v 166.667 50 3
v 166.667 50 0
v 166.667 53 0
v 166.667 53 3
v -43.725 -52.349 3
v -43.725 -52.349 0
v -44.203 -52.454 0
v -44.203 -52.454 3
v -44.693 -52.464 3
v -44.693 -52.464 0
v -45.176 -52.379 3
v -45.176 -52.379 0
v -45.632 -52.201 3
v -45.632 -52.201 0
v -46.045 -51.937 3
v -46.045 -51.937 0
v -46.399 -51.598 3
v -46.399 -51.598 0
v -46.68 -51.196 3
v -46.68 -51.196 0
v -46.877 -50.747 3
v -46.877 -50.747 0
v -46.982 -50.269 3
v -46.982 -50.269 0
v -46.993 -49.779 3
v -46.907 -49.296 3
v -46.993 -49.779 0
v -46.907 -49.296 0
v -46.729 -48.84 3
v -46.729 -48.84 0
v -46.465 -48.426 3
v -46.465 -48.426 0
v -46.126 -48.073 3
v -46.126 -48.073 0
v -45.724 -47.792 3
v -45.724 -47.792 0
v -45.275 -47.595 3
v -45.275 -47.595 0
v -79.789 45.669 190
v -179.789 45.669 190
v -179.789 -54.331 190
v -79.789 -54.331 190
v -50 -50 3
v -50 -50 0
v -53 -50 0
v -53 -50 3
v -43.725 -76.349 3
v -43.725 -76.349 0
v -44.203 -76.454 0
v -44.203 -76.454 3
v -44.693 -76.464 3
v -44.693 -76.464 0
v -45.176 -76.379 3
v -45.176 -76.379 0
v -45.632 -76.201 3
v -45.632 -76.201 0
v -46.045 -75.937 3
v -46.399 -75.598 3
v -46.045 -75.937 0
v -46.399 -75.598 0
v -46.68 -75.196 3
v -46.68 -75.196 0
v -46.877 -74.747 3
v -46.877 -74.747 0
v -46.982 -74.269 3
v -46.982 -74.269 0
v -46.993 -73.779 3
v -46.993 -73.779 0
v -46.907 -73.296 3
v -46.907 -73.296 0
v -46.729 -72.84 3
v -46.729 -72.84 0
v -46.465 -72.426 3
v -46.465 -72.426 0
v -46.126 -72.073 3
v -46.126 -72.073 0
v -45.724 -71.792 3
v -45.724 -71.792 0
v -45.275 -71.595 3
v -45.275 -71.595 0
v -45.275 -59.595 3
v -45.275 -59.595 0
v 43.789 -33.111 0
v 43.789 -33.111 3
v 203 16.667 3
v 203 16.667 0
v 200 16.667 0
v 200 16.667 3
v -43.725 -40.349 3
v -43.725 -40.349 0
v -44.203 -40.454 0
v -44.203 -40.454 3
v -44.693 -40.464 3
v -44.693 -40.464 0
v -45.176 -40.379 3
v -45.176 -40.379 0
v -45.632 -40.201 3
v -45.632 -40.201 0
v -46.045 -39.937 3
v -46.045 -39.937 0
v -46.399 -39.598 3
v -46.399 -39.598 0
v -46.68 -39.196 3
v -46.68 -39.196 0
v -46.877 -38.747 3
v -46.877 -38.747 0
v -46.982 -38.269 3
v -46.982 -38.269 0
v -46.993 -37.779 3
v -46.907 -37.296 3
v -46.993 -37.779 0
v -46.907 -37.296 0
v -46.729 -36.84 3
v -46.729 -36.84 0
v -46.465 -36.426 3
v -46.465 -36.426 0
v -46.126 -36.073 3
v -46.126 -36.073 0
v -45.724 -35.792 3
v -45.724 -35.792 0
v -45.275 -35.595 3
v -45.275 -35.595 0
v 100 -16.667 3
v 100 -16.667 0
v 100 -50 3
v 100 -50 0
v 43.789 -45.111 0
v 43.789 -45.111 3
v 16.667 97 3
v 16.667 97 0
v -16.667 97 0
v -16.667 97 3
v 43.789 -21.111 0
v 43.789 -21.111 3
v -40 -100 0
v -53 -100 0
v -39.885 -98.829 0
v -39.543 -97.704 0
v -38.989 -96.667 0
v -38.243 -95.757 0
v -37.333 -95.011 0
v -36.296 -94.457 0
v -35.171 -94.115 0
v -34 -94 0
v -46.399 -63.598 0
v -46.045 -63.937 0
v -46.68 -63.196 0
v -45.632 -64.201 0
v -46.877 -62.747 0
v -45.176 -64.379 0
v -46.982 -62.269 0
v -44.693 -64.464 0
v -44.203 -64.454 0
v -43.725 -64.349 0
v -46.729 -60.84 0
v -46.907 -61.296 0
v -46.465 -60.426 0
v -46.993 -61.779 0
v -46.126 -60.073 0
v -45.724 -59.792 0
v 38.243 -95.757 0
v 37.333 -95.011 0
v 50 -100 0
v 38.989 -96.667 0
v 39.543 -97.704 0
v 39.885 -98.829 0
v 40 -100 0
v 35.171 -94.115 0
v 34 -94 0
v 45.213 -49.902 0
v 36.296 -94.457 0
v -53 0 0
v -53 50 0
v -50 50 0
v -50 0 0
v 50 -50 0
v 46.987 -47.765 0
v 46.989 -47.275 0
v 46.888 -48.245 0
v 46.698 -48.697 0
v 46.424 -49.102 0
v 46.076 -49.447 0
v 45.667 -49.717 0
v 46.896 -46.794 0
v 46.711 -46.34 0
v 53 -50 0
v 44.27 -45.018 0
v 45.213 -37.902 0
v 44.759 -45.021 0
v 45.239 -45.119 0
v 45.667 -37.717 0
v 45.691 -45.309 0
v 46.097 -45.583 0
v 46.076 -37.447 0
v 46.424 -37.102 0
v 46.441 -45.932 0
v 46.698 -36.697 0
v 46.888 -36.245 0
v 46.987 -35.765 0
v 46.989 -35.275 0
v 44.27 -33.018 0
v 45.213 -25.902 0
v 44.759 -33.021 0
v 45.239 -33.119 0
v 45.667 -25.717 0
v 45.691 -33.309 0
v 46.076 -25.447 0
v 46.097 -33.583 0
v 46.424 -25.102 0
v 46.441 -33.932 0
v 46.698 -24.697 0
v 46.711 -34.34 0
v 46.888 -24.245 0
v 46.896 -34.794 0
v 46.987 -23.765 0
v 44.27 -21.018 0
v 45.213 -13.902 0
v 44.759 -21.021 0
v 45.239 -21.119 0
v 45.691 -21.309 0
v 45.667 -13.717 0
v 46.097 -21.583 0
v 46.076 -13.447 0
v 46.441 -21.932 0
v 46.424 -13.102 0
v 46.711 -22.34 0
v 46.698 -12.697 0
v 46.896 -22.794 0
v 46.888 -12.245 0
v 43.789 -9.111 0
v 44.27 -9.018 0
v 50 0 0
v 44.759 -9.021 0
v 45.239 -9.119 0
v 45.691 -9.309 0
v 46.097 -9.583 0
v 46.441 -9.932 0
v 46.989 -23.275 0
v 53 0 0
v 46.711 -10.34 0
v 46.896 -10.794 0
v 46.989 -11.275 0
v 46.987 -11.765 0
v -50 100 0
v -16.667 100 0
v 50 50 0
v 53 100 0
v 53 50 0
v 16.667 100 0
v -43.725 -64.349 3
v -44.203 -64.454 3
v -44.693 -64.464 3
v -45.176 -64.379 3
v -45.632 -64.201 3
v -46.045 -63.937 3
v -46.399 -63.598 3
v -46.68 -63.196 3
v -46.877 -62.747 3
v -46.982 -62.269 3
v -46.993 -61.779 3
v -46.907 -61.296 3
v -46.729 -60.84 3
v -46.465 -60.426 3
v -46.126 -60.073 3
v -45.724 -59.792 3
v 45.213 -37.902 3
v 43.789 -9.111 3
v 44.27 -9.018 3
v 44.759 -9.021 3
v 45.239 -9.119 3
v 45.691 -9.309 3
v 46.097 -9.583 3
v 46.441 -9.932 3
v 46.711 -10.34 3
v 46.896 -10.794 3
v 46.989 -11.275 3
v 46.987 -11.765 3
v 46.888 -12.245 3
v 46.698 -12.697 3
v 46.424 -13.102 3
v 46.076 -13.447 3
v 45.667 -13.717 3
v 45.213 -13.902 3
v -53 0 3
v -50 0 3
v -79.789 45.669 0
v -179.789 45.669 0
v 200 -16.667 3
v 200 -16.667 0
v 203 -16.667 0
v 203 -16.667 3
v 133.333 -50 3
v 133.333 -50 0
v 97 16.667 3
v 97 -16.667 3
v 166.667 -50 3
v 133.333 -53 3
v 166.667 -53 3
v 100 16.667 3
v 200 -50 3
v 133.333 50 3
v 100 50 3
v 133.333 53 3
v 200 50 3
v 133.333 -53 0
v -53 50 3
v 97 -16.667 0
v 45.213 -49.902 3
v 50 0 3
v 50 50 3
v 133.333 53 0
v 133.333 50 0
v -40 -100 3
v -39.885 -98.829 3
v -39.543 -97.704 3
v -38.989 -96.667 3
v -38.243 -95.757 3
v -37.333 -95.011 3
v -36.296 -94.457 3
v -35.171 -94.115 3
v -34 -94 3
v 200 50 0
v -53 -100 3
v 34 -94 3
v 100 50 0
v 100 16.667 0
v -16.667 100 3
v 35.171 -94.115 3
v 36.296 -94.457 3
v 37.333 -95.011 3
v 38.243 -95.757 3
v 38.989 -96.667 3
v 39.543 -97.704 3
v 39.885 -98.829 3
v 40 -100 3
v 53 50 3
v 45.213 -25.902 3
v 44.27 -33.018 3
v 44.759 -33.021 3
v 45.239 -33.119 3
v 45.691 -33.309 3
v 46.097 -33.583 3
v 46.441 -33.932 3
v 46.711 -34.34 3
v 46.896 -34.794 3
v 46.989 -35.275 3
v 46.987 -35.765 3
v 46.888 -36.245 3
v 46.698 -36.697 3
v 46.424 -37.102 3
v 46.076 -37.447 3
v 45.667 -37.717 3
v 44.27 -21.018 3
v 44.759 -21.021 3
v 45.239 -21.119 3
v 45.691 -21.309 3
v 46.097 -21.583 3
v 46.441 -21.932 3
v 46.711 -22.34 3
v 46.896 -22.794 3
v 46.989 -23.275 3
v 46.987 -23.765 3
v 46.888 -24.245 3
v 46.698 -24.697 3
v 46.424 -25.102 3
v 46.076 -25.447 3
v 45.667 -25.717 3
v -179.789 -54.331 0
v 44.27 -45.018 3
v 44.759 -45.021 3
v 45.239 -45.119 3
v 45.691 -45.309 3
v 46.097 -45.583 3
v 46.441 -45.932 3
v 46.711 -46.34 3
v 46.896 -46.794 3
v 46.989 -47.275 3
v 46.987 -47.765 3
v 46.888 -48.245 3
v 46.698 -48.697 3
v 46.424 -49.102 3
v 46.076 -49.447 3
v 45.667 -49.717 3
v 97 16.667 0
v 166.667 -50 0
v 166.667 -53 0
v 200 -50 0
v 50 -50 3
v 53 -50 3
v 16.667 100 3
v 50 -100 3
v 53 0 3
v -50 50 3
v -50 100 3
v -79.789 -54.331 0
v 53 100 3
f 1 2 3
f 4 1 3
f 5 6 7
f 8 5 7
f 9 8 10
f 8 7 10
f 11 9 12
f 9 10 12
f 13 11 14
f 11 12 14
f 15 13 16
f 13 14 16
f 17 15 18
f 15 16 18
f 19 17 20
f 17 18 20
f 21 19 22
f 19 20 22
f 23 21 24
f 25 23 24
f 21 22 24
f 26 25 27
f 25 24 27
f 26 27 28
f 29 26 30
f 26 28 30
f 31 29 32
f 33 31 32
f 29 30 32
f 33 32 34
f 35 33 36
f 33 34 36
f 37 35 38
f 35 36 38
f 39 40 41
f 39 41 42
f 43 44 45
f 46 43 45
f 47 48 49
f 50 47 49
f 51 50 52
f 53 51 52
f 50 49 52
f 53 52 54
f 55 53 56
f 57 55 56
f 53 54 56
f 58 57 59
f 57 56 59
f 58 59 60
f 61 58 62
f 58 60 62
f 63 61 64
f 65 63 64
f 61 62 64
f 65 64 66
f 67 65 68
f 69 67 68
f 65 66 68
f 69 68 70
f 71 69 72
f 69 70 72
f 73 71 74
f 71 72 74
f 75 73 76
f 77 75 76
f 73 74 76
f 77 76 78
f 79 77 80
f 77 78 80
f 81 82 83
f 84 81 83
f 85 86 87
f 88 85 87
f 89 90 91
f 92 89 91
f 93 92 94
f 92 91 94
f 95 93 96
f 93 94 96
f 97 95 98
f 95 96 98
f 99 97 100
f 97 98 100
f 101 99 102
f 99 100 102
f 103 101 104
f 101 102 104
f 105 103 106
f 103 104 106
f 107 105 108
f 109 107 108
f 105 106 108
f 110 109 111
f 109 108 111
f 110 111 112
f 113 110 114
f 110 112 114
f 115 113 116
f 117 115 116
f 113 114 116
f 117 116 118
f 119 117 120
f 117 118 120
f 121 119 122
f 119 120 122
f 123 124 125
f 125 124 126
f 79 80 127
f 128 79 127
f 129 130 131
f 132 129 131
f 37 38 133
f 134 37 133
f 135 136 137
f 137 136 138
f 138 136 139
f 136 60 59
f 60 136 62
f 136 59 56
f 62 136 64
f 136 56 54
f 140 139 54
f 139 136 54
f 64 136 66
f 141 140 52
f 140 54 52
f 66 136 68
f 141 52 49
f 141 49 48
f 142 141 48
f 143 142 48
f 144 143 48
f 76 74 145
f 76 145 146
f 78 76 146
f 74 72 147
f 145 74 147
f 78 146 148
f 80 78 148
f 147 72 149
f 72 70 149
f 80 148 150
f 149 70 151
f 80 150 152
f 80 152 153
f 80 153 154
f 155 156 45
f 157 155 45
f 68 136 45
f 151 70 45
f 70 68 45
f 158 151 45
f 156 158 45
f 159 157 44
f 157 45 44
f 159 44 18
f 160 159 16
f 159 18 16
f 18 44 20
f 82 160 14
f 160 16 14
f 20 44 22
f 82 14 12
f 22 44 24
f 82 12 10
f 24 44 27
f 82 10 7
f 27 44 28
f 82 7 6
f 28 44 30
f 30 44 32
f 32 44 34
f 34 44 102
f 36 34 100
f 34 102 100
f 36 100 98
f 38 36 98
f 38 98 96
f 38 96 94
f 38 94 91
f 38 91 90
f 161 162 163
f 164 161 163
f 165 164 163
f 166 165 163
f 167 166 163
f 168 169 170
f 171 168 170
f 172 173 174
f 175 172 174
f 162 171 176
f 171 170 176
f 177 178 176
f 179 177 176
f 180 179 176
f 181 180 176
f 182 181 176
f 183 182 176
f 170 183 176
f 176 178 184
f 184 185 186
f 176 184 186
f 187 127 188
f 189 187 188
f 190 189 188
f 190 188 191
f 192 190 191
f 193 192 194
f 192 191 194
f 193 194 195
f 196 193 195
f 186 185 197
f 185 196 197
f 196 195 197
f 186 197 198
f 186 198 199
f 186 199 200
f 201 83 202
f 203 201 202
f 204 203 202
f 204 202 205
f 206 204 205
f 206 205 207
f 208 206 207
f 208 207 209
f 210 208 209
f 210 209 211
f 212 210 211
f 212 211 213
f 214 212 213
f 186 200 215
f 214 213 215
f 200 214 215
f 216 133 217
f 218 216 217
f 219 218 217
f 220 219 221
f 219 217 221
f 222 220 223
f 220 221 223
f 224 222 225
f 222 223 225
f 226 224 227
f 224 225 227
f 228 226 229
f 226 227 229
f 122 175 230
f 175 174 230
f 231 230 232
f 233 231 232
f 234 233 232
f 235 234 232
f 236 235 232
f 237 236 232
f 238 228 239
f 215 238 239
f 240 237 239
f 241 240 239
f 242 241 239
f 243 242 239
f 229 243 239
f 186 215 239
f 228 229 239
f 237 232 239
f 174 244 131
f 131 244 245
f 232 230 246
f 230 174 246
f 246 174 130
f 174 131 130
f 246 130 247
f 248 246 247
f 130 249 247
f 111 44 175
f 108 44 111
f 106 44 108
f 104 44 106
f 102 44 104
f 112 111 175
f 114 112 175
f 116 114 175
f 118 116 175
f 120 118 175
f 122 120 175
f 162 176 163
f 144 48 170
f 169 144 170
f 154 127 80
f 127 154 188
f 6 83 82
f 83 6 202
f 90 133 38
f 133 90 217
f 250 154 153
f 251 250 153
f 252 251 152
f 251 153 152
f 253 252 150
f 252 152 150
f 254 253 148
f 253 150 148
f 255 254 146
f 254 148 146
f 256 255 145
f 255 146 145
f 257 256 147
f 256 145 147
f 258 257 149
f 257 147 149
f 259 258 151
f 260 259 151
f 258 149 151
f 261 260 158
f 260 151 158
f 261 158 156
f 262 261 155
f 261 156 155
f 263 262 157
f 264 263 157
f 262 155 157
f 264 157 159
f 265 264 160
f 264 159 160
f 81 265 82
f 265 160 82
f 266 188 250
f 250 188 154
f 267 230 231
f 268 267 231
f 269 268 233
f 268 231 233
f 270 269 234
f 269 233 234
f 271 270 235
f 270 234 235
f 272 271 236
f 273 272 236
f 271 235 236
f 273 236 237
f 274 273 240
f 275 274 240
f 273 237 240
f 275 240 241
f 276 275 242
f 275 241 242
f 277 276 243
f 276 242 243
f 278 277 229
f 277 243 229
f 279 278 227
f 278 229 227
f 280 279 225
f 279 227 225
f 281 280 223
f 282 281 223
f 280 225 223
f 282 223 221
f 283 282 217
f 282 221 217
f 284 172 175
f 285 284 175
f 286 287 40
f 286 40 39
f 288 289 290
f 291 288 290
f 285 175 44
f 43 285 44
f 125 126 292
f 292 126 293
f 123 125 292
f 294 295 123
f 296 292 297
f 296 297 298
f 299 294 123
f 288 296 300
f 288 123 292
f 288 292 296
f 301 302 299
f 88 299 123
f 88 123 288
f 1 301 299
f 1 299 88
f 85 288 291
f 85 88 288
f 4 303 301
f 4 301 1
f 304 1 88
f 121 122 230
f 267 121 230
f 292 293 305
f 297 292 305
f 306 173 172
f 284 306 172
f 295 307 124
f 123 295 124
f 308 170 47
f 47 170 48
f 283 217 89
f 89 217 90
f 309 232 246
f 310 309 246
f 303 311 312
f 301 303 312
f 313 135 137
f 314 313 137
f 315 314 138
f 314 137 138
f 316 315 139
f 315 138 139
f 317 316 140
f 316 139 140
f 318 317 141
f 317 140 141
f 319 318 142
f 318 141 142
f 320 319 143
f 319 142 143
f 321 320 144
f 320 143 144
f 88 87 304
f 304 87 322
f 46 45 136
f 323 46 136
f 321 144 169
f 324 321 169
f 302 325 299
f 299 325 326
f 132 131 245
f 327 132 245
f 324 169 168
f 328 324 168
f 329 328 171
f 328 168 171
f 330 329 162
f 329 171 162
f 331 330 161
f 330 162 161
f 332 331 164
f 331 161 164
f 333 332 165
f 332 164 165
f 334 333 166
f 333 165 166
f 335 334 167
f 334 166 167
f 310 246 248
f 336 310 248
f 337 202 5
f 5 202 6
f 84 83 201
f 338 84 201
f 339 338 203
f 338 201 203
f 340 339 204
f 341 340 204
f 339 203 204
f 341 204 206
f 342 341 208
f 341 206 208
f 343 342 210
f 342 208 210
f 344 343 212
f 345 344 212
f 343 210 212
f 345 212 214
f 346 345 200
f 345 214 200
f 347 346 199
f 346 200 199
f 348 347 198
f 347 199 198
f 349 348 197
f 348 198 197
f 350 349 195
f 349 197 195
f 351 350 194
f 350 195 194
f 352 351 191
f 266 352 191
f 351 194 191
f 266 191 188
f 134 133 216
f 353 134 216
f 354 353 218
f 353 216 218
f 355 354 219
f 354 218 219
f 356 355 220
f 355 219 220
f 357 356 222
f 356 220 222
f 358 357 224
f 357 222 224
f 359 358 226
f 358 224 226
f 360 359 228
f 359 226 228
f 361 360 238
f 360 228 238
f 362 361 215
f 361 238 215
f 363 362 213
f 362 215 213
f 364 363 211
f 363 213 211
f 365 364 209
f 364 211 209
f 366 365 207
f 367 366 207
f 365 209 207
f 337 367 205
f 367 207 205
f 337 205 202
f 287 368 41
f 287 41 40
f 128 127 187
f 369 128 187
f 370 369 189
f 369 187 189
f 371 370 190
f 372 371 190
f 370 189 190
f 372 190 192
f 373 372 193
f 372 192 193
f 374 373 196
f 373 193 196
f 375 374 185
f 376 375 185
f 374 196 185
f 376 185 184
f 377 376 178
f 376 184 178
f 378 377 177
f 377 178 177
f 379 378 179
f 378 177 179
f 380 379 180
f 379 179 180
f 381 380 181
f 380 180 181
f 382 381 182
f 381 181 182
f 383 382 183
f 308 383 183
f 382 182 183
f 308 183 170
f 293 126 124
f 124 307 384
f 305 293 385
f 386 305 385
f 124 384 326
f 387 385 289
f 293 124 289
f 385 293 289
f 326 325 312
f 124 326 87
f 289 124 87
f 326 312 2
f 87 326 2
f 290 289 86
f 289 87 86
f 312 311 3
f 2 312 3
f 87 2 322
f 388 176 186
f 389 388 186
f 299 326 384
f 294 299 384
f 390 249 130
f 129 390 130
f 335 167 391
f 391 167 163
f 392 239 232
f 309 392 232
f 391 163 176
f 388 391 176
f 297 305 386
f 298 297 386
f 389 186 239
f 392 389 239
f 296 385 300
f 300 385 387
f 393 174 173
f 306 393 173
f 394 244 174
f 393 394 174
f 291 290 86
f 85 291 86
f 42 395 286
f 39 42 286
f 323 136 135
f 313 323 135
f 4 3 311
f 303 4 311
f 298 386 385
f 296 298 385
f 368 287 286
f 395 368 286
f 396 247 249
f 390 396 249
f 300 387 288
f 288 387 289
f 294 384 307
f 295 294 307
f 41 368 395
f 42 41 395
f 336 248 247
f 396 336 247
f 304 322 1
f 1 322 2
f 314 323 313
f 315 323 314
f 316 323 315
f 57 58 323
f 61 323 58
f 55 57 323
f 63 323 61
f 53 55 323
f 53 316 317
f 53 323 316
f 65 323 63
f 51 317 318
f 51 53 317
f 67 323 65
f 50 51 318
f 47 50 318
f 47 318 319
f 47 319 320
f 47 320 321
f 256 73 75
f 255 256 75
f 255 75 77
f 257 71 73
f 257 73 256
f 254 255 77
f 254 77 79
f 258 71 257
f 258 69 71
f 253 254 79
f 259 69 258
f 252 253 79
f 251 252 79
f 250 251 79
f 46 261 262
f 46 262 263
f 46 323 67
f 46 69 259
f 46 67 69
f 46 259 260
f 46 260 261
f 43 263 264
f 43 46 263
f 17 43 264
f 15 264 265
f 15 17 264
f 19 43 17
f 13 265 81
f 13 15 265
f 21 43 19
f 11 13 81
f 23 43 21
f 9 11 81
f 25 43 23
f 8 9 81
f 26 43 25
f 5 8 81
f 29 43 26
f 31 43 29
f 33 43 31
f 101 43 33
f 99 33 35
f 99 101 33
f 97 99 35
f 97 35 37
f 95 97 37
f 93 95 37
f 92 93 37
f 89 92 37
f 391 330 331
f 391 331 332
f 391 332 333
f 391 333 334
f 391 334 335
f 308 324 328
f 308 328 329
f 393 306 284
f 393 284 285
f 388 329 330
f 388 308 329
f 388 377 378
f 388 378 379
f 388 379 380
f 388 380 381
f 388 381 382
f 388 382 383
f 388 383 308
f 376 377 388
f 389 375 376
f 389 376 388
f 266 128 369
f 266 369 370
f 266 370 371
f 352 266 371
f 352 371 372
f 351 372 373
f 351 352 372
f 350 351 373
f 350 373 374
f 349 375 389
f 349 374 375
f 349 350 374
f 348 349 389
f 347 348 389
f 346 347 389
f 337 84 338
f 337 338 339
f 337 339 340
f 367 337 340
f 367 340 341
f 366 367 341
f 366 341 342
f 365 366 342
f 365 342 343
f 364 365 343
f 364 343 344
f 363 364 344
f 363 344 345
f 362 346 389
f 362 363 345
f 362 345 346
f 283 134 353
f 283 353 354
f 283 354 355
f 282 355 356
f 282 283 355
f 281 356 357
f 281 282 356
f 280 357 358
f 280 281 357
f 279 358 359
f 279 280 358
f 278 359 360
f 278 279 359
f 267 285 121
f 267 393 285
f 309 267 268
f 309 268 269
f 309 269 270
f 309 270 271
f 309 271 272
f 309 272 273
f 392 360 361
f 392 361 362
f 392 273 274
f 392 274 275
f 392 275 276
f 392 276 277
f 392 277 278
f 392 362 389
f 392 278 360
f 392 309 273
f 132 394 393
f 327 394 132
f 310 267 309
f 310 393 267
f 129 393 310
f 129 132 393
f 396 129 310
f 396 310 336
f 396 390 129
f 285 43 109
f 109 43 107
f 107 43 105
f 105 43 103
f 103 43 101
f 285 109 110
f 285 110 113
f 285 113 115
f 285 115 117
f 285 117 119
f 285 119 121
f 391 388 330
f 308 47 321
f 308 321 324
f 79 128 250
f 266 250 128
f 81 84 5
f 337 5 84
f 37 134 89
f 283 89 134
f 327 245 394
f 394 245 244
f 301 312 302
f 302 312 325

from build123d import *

# Parameters (mm, degrees)
F1_DEPTH = 3
F2_W     = 100
F2_H     = 100
F3_DEPTH = 190


# Not quite as in the source:
# - a feature names something its author has since deleted; it is built from what else it names


with BuildPart() as f1:
    # F0 (on Top) → F1 (new body)
    with BuildSketch(Plane.XY):
        with BuildLine():
            Line((-16.6666666667, 100), (-50, 100))
            Line((-50, 100), (-50, 50))
            Line((-50, 50), (-53, 50))
            Line((-53, 50), (-53, 0))
            Line((-53, 0), (-50, 0))
            Line((-50, 0), (-50, -50))
            Line((-50, -50), (-53, -50))
            Line((-53, -50), (-53, -100))
            Line((-53, -100), (-50, -100))
            Line((-50, -100), (-40, -100))
            ThreePointArc((-40, -100), (-38.2426406871, -95.7573593129), (-34, -94))
            Line((-34, -94), (34, -94))
            ThreePointArc((34, -94), (38.2426406871, -95.7573593129), (40, -100))
            Line((40, -100), (50, -100))
            Line((50, -100), (50, -50))
            Line((50, -50), (53, -50))
            Line((53, -50), (53, 0))
            Line((53, 0), (50, 0))
            Line((50, 0), (50, 50))
            Line((50, 50), (53, 50))
            Line((53, 50), (53, 100))
            Line((53, 100), (50, 100))
            Line((50, 100), (16.6666666667, 100))
            Line((16.6666666667, 100), (16.6666666667, 97))
            Line((16.6666666667, 97), (-16.6666666667, 97))
            Line((-16.6666666667, 97), (-16.6666666667, 100))
        make_face()
        with BuildLine():
            ThreePointArc((-43.7245756516, -76.3485534214), (-46.8767029852, -74.7472747846), (-45.2754243484, -71.595147451))
            Line((-45.2754243484, -71.595147451), (43.7885479556, -45.1109843029))
            ThreePointArc((43.7885479556, -45.1109843029), (46.8963350712, -46.7941332679), (45.2131861062, -49.9019203835))
            Line((45.2131861062, -49.9019203835), (-43.7245756516, -76.3485534214))
        make_face(mode=Mode.SUBTRACT)
        with BuildLine():
            Line((45.2131861062, -37.9019203835), (-43.7245756516, -64.3485534214))
            ThreePointArc((-43.7245756516, -64.3485534214), (-46.8767029852, -62.7472747846), (-45.2754243484, -59.595147451))
            Line((-45.2754243484, -59.595147451), (43.7885479556, -33.1109843029))
            ThreePointArc((43.7885479556, -33.1109843029), (46.8963350712, -34.7941332679), (45.2131861062, -37.9019203835))
        make_face(mode=Mode.SUBTRACT)
        with BuildLine():
            Line((45.2131861062, -25.9019203835), (-43.7245756516, -52.3485534214))
            ThreePointArc((-43.7245756516, -52.3485534214), (-46.8767029852, -50.7472747846), (-45.2754243484, -47.595147451))
            Line((-45.2754243484, -47.595147451), (43.7885479556, -21.1109843029))
            ThreePointArc((43.7885479556, -21.1109843029), (46.8963350712, -22.7941332679), (45.2131861062, -25.9019203835))
        make_face(mode=Mode.SUBTRACT)
        with BuildLine():
            Line((45.2131861062, -13.9019203835), (-43.7245756516, -40.3485534214))
            ThreePointArc((-43.7245756516, -40.3485534214), (-46.8767029852, -38.7472747846), (-45.2754243484, -35.595147451))
            Line((-45.2754243484, -35.595147451), (43.7885479556, -9.1109843029))
            ThreePointArc((43.7885479556, -9.1109843029), (46.8963350712, -10.7941332679), (45.2131861062, -13.9019203835))
        make_face(mode=Mode.SUBTRACT)
    extrude(amount=F1_DEPTH)


with BuildPart() as f1b:
    # F0 (on Top) → F1, piece 2 (new body)
    with BuildSketch(Plane.XY):
        Polygon((133.3333333333, 50), (100, 50), (100, 16.6666666667), (97, 16.6666666667), (97, -16.6666666667), (100, -16.6666666667), (100, -50), (133.3333333333, -50), (133.3333333333, -53), (166.6666666667, -53), (166.6666666667, -50), (200, -50), (200, -16.6666666667), (203, -16.6666666667), (203, 16.6666666667), (200, 16.6666666667), (200, 50), (166.6666666667, 50), (166.6666666667, 53), (133.3333333333, 53), align=None)
    extrude(amount=F1_DEPTH)


with BuildPart() as f3:
    # F2 (on Top) → F3 (new body)
    with BuildSketch(Plane.XY):
        with Locations((-129.7888755798, -4.3312566519)):
            Rectangle(F2_W, F2_H)
    extrude(amount=F3_DEPTH)


solid = Compound([f1.part, f1b.part, f3.part])
